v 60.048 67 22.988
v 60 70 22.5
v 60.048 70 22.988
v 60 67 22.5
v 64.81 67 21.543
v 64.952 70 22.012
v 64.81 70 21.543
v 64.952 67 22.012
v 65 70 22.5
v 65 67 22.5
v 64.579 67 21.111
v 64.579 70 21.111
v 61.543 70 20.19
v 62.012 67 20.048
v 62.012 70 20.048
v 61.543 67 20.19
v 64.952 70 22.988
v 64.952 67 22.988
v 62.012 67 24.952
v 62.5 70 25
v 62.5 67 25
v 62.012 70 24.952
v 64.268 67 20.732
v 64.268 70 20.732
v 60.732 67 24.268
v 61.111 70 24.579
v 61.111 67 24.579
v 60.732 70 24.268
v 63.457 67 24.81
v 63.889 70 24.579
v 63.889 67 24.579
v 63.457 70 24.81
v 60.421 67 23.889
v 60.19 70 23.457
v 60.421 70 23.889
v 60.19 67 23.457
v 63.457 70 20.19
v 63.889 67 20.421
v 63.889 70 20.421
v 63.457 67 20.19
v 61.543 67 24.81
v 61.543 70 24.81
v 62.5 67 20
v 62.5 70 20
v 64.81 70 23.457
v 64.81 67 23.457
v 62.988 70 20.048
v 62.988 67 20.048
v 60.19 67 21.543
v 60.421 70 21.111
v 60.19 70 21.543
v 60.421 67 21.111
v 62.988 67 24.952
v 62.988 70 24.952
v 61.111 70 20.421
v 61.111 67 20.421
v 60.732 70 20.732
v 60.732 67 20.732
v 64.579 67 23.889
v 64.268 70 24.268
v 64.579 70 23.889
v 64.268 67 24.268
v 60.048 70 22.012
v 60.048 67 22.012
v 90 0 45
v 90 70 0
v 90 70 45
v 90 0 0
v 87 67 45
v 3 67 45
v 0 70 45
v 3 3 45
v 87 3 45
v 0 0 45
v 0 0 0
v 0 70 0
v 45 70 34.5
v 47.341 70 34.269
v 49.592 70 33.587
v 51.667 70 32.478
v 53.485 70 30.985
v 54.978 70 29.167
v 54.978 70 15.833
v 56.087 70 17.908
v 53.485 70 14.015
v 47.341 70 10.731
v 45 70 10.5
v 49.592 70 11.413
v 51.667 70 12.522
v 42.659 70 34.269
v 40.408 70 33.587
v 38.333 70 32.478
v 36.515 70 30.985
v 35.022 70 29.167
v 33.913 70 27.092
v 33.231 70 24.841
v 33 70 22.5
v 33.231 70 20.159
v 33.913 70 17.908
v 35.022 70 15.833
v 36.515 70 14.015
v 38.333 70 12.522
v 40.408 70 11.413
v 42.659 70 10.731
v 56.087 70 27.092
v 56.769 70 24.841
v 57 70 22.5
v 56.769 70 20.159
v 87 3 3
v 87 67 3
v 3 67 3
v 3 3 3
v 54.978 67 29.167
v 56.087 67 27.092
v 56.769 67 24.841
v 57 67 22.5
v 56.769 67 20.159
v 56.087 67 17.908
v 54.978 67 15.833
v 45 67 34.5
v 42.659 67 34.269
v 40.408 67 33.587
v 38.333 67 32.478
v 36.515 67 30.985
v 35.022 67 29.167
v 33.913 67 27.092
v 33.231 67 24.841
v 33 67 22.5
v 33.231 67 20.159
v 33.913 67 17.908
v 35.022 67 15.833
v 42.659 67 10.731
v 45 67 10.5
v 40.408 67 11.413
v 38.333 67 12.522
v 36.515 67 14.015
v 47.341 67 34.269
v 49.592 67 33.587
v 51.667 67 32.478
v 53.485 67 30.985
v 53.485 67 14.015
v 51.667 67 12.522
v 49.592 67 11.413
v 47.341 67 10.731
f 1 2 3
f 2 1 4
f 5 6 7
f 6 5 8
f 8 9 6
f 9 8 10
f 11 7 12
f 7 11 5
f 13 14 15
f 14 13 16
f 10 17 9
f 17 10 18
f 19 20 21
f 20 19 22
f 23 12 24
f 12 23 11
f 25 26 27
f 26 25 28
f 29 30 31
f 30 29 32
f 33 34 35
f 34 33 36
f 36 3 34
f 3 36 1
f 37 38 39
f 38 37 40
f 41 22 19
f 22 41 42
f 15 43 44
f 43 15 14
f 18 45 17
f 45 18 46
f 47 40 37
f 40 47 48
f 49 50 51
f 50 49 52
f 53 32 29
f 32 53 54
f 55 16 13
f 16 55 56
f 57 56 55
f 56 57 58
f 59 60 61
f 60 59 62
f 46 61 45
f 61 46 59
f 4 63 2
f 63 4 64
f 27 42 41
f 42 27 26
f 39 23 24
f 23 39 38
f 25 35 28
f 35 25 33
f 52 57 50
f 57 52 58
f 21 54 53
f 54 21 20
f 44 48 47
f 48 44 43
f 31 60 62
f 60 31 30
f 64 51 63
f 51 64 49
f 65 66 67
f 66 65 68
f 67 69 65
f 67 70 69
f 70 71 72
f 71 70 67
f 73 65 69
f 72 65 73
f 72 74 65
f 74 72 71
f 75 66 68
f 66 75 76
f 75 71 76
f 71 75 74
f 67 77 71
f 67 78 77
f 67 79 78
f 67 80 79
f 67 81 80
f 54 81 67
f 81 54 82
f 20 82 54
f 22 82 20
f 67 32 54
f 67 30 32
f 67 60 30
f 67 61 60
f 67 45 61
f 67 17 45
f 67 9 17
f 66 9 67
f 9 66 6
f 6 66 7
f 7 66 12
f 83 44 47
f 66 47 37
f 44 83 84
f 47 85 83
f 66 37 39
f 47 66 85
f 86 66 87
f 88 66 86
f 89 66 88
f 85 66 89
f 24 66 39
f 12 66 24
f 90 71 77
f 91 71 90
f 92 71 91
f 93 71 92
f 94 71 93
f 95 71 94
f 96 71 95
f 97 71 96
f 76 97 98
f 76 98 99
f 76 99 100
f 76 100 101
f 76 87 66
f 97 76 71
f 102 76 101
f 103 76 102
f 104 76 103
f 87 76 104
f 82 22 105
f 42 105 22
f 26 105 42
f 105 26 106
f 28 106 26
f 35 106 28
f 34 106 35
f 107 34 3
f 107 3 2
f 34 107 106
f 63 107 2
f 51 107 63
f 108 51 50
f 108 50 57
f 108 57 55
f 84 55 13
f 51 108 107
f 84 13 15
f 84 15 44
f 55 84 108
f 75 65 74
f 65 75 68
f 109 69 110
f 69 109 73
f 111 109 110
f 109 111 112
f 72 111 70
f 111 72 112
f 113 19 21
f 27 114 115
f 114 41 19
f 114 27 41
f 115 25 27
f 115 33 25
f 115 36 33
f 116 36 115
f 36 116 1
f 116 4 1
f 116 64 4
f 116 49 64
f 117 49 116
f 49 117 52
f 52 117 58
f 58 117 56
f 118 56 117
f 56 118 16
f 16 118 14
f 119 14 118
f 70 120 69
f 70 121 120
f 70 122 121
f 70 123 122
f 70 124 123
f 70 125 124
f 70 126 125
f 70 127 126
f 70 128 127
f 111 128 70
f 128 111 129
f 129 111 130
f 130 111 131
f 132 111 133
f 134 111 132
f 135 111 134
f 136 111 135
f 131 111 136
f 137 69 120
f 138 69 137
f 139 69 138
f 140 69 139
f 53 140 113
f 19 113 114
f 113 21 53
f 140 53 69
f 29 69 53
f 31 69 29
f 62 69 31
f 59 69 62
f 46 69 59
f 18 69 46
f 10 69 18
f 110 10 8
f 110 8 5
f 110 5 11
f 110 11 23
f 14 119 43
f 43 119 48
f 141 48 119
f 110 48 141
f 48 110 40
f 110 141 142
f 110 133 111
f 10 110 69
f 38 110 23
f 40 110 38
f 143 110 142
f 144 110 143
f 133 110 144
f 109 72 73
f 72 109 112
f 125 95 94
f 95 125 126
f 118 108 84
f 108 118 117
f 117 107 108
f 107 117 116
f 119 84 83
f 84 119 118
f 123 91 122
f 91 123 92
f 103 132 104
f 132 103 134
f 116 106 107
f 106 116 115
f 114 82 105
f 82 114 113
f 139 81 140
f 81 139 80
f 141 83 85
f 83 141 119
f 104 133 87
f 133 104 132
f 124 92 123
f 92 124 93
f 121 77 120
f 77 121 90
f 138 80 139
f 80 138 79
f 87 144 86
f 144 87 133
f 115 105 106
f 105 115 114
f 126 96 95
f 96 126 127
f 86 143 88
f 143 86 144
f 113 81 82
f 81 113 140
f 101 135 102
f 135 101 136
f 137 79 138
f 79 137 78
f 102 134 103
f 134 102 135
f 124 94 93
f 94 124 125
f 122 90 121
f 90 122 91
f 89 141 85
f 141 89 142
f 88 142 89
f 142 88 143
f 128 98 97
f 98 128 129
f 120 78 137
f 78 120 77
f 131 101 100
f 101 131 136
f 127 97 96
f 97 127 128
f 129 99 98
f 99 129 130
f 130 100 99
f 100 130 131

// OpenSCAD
$fn = 32;

// ----------------------------------------------------------------------
// Vent box: roundvent enclosure
// ----------------------------------------------------------------------

// --- parameters (mm) ---
box_l = 90;               // box length, X
box_w = 70;               // box width, Y
box_h = 45;               // box height, Z
wall_t = 3;               // shell wall thickness
vent_d = 24;              // central vent diameter
ring_d = 5;               // ring hole diameter
n_ring = 8;               // holes in the ring
ring_r = 17.5;            // ring radius

ring_step = 360 / n_ring;  // ring hole angular step

difference() {
  cube([box_l, box_w, box_h]);
  translate([wall_t, wall_t, wall_t])
    cube([box_l - 2 * wall_t, box_w - 2 * wall_t, box_h]);
  translate([box_l / 2, box_w - wall_t - 1, box_h / 2])
    rotate([-90, 0, 0]) cylinder(h = wall_t + 2, d = vent_d);
  for (i = [0 : n_ring - 1])
    translate([box_l / 2, box_w - wall_t - 1, box_h / 2])
      rotate([0, 0, i * ring_step])
        translate([ring_r, 0, 0]) rotate([-90, 0, 0])
          cylinder(h = wall_t + 2, d = ring_d);
}
